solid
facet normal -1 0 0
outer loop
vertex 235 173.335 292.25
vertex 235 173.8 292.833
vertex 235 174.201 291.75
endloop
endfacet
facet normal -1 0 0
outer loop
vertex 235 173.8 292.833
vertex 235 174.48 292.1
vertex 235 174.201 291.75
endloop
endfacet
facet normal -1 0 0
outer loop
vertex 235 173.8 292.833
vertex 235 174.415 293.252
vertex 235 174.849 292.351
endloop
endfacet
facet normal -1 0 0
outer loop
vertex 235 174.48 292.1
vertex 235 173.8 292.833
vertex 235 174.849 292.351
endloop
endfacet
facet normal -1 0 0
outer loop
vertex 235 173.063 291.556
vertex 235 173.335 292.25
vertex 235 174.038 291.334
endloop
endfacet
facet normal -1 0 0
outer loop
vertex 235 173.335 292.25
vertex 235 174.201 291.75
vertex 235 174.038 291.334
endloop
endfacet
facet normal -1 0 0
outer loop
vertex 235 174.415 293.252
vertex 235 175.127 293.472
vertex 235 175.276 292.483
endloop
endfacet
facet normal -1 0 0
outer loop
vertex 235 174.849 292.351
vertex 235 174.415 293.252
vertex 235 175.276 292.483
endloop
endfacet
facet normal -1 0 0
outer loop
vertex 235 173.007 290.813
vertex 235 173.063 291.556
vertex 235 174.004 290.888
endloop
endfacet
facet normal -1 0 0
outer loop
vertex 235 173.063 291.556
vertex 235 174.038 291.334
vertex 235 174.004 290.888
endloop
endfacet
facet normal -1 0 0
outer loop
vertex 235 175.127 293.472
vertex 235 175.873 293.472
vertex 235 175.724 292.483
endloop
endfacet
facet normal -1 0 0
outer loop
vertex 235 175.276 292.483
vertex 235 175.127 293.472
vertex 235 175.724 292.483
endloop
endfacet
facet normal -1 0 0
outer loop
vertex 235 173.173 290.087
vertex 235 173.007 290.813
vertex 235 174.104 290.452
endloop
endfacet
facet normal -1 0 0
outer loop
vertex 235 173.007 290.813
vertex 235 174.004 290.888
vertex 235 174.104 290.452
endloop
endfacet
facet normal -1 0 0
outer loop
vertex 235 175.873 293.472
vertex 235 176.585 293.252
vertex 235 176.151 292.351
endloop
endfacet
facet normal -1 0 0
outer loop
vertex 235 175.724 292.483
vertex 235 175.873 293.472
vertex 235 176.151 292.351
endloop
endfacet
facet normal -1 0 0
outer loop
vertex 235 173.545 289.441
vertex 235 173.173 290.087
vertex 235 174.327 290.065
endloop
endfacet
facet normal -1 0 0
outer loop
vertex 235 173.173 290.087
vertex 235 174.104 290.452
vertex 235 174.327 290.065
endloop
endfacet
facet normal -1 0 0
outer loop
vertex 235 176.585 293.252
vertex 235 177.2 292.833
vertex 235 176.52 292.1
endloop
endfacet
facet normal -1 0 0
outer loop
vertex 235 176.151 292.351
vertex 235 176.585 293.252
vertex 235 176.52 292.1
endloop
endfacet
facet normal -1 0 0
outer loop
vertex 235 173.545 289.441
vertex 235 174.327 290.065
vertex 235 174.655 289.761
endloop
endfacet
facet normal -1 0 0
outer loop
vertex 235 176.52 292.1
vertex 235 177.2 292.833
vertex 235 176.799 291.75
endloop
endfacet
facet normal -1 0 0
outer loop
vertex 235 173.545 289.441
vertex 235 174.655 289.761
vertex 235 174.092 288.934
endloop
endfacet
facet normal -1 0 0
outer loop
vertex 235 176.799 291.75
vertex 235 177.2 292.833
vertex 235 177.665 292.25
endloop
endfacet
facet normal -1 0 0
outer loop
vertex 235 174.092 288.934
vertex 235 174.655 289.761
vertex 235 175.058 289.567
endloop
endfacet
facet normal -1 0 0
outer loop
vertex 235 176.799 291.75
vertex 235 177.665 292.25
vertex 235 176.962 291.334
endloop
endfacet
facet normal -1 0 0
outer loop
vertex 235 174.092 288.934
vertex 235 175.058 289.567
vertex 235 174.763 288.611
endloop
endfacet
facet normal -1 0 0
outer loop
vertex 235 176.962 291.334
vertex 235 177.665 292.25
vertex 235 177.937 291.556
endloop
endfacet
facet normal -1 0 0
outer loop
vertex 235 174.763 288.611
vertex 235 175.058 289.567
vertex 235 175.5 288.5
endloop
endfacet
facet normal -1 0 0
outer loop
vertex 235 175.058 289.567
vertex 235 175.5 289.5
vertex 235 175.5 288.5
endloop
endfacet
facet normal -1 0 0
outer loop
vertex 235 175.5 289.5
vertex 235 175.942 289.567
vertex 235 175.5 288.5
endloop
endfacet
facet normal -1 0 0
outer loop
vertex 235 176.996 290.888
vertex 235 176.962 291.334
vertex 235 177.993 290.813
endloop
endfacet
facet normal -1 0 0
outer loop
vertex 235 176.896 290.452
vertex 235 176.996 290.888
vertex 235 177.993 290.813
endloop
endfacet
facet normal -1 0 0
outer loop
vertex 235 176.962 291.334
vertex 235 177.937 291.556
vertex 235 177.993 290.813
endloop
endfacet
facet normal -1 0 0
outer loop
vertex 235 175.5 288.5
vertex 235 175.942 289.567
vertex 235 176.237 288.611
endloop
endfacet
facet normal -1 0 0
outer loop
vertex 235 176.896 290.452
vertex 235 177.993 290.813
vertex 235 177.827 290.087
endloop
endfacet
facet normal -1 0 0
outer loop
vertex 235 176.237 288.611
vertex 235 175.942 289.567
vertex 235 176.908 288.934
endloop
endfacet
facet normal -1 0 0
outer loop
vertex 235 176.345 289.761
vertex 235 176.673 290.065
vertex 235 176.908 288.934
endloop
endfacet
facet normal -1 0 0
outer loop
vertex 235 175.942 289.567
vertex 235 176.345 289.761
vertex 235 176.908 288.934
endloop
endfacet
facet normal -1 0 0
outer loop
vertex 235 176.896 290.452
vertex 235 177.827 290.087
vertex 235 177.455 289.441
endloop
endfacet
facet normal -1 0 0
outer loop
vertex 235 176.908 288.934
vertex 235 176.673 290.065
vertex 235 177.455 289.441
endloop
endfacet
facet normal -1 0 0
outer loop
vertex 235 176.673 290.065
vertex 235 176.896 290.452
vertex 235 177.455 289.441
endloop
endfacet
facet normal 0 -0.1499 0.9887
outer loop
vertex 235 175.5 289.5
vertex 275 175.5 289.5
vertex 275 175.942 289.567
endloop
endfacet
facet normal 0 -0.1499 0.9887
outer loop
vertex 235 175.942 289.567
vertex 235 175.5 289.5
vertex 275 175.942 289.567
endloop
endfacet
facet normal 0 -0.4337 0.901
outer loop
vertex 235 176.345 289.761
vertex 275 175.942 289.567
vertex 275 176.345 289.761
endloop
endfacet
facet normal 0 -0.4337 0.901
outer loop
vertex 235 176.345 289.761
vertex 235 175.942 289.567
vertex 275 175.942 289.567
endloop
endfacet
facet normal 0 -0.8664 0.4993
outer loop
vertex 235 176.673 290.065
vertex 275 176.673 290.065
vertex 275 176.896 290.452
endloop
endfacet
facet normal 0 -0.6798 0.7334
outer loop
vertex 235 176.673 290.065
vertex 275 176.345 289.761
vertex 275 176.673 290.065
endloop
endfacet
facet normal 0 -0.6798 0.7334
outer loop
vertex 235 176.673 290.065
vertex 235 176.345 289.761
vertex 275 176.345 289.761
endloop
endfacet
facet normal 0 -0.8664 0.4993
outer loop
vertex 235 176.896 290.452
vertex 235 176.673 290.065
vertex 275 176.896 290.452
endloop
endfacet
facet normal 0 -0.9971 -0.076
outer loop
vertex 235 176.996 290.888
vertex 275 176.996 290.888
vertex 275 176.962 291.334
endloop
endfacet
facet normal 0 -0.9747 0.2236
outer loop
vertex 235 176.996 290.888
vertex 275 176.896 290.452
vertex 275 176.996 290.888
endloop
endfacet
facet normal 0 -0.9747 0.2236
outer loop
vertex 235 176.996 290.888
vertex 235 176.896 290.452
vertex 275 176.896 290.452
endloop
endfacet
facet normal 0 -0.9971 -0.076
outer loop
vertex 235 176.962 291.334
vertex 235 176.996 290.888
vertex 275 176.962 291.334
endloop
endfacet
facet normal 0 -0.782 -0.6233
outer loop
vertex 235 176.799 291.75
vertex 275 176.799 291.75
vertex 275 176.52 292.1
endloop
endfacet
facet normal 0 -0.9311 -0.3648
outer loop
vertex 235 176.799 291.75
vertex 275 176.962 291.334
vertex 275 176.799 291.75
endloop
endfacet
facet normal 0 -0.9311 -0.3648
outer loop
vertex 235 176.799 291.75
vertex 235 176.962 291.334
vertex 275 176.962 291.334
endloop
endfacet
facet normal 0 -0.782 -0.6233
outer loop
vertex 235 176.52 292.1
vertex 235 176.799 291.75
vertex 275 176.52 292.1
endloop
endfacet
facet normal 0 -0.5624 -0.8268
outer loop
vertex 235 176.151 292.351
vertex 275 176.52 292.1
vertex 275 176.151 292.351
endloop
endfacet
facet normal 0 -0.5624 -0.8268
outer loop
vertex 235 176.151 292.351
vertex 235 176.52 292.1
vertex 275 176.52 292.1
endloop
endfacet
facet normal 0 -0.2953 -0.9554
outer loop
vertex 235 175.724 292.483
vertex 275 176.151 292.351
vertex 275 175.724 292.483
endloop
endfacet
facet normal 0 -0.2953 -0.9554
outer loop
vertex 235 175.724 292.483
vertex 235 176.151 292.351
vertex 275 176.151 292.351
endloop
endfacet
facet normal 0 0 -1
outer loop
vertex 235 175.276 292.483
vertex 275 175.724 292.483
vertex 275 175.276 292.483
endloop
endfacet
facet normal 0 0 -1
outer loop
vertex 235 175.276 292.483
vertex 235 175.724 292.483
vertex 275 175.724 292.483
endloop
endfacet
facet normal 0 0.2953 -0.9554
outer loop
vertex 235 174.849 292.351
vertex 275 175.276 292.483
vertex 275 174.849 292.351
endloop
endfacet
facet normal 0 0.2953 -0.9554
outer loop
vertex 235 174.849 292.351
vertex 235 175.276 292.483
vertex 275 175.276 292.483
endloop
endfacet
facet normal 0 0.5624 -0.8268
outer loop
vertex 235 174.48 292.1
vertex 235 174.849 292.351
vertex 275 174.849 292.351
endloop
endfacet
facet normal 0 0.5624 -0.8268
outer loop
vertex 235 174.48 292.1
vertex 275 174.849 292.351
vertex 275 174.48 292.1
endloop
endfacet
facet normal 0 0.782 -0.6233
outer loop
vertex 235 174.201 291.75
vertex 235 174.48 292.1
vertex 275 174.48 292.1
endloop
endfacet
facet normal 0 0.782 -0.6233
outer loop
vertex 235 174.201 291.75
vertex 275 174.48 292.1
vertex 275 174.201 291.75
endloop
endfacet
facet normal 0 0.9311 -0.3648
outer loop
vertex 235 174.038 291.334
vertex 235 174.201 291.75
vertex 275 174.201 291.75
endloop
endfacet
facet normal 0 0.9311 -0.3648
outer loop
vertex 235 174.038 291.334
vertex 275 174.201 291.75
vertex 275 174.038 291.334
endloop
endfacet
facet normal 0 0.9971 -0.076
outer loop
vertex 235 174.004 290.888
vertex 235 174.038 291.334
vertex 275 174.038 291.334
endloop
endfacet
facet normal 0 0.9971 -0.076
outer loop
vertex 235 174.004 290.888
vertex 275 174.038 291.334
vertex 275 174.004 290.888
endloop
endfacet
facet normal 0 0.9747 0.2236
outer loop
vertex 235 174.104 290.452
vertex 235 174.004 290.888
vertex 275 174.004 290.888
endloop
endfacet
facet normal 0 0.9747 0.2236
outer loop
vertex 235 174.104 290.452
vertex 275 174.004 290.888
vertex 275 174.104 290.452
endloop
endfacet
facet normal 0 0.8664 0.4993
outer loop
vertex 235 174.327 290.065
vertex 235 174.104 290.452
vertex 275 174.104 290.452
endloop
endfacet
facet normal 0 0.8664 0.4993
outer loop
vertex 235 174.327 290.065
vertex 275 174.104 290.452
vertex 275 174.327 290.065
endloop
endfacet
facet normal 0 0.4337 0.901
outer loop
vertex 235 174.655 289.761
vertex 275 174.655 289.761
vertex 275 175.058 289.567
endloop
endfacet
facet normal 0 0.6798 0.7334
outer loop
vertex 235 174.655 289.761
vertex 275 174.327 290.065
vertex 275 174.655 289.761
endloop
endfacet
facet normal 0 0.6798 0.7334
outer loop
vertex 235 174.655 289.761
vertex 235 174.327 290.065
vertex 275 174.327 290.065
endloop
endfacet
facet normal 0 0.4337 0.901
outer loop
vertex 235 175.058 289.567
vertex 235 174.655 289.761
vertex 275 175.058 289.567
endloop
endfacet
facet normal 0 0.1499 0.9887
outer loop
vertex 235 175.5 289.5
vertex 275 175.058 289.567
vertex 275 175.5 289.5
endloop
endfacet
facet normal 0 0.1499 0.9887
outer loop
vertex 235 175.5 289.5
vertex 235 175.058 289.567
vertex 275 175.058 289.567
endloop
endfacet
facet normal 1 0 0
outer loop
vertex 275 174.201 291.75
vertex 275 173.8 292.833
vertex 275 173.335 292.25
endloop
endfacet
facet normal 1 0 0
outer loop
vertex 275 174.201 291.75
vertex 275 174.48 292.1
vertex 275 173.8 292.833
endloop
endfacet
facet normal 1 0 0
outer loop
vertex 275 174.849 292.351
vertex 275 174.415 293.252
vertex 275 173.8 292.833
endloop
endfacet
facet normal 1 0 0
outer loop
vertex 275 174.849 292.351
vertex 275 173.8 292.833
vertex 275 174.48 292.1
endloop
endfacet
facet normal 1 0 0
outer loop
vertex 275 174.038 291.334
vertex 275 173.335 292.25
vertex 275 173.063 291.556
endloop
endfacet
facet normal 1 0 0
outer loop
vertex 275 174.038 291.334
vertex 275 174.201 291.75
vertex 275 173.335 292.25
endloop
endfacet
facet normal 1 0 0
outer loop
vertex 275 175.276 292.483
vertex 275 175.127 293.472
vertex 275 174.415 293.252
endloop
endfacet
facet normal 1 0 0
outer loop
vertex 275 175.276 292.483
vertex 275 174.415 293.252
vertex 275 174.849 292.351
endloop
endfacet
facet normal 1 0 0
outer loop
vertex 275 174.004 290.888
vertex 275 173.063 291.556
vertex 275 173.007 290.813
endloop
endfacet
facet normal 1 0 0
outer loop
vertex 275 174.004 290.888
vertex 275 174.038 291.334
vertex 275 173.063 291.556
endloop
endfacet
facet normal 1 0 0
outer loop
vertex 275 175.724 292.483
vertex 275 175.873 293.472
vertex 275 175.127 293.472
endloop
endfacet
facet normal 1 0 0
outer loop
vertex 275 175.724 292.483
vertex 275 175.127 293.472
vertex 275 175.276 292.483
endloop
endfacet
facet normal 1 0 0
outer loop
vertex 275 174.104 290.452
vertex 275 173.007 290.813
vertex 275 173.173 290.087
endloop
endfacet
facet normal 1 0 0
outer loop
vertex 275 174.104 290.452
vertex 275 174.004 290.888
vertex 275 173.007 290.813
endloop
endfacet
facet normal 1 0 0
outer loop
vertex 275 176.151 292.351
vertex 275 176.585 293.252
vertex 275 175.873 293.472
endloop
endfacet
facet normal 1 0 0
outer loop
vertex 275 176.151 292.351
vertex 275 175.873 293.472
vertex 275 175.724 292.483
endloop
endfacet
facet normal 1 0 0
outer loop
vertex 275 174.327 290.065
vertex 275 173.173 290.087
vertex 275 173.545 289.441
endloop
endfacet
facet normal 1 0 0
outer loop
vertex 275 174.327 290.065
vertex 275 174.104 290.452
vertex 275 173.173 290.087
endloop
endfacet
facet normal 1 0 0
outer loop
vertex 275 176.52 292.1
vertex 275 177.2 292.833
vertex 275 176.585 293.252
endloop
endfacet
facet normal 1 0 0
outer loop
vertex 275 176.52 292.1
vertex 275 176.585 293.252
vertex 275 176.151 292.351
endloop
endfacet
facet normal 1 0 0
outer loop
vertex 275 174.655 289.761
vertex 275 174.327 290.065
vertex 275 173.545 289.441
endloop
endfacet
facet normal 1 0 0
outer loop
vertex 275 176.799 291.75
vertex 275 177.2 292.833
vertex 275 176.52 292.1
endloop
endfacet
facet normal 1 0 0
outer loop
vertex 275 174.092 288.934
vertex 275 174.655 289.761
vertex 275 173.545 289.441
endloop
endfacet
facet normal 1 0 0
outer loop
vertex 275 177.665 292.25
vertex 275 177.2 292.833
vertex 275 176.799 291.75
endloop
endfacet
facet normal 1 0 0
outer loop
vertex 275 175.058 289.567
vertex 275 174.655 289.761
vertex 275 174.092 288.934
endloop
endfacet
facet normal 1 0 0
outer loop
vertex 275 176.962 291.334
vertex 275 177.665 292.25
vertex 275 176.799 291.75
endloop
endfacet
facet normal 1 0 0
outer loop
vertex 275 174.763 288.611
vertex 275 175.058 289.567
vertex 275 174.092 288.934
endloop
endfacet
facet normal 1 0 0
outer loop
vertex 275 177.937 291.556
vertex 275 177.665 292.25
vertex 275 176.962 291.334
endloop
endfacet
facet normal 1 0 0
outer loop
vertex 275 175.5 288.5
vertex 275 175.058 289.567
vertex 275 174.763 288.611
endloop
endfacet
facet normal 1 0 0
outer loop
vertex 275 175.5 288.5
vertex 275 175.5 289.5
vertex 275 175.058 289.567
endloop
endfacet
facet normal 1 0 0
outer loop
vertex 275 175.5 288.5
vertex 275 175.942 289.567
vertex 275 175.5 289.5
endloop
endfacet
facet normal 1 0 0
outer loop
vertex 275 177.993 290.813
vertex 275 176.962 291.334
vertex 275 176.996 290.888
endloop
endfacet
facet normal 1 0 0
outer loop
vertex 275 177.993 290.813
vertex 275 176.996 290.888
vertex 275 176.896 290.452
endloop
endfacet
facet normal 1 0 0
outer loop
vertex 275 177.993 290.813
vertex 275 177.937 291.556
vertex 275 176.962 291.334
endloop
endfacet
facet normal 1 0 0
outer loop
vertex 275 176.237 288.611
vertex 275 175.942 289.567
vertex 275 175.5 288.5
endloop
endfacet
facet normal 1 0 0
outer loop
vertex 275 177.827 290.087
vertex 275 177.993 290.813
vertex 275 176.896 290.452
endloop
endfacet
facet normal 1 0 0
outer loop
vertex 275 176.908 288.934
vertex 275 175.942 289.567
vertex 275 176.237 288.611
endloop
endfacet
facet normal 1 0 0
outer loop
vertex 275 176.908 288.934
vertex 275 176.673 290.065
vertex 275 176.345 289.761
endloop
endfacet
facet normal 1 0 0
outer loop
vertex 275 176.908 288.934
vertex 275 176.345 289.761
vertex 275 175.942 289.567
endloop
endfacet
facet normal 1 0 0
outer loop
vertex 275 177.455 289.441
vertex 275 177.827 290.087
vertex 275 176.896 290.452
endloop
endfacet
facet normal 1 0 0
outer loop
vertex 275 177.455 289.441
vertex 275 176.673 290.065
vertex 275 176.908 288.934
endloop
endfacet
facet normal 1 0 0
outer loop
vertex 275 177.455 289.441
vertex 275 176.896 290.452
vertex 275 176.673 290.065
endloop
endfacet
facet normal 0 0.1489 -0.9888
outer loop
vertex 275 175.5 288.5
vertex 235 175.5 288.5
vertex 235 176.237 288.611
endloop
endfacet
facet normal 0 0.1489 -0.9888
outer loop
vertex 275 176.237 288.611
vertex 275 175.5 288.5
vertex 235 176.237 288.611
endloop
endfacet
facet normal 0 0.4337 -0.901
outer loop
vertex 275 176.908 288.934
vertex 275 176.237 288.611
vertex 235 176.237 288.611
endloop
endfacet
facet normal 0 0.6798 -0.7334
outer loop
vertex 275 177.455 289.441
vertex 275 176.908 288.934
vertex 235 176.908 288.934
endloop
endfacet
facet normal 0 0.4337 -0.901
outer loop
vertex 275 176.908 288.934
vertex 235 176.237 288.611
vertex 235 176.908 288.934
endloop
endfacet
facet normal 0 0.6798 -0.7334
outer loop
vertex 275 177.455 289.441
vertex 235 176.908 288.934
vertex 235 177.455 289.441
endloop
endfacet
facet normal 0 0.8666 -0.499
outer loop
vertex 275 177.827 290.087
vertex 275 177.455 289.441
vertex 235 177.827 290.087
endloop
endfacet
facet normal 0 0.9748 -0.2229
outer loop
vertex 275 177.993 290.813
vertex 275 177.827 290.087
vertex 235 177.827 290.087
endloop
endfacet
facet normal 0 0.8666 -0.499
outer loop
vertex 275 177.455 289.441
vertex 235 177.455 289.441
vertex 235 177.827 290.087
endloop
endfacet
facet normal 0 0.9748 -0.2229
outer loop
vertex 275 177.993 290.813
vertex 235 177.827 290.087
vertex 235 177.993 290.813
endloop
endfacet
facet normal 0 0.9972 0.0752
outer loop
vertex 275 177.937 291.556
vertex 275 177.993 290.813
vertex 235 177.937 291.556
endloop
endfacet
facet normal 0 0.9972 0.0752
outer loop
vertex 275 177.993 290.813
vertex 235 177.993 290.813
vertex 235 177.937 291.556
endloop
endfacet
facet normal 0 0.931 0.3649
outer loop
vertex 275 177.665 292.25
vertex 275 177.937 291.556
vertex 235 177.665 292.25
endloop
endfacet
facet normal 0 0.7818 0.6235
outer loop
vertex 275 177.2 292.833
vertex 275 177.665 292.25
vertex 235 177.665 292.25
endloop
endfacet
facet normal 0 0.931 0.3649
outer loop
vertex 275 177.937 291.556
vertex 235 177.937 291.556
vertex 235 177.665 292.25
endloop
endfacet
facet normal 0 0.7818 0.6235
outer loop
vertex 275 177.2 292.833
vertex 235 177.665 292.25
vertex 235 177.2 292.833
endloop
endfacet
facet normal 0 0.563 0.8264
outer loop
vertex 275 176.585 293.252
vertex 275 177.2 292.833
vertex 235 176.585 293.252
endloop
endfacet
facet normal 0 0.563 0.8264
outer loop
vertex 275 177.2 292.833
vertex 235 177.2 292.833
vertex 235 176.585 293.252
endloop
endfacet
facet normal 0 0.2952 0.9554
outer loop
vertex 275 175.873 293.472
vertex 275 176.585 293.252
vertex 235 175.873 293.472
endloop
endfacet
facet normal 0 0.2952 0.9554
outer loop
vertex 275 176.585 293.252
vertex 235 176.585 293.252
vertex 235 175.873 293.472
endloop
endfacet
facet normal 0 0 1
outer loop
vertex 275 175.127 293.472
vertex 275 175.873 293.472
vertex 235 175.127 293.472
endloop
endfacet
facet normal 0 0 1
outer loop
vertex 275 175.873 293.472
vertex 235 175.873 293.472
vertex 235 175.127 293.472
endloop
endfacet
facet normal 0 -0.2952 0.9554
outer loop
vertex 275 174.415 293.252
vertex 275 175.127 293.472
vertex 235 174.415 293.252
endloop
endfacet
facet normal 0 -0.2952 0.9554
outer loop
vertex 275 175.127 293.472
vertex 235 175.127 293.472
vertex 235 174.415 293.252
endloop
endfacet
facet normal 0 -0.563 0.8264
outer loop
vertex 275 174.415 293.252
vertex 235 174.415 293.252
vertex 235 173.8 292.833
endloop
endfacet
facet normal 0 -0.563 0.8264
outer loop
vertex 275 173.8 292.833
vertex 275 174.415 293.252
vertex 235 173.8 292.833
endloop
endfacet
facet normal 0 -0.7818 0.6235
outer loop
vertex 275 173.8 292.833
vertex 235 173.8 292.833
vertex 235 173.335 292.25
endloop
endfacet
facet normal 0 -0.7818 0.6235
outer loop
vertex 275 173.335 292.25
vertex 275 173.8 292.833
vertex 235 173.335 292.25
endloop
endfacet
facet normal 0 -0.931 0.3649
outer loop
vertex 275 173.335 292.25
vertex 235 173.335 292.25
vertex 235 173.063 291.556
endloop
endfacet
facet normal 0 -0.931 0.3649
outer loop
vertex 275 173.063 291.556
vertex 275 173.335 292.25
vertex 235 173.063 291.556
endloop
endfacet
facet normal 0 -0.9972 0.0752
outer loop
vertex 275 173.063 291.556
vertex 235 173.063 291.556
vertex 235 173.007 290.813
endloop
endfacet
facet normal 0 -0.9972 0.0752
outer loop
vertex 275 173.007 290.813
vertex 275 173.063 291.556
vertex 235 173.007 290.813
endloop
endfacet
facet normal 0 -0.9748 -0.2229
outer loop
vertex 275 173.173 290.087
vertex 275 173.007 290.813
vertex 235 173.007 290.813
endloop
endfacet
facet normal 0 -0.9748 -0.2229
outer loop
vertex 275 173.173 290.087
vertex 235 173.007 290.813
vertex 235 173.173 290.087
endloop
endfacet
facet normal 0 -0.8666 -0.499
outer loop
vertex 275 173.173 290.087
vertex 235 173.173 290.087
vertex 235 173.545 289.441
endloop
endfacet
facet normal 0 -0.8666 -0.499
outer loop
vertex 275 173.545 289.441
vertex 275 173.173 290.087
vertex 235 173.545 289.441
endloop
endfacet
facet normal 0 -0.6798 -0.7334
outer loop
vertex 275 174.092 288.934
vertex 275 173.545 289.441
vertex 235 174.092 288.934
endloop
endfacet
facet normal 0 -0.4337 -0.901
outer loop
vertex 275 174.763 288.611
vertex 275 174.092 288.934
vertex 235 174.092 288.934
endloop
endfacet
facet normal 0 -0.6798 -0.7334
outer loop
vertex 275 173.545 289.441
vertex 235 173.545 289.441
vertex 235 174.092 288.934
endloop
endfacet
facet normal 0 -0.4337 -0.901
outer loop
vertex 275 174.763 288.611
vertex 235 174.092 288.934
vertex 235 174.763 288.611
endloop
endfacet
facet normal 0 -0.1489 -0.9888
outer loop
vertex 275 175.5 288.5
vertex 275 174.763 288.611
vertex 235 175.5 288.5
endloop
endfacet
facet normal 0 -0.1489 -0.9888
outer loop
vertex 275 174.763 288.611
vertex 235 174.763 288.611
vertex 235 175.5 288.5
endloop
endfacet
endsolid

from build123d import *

# Parameters (mm, degrees)
CYLINDER001_R           = 1.5
CYLINDER001_DEPTH       = 44
CYLINDER001_PITCH_ANGLE = 90
CYLINDER_R              = 2.5
CYLINDER_DEPTH          = 40
CYLINDER_PITCH_ANGLE    = 90


with BuildPart() as cilindro001:
    # Cylinder001 → Cylinder001 (new body)
    with BuildSketch(Plane.XY):
        Circle(CYLINDER001_R)
    extrude(amount=CYLINDER001_DEPTH)


with BuildPart() as cilindro001_1:
    # Cylinder001 pitch: moved
    add(cilindro001.part.rotate(Axis((0, 0, 0), (0, 1, 0)), CYLINDER001_PITCH_ANGLE))


with BuildPart() as cilindro001_2:
    # Cylinder001 placement: moved
    add(cilindro001_1.part.moved(Location((-2, 0, 0))))


with BuildPart() as soporte1:
    # Cylinder → Cylinder (new body)
    with BuildSketch(Plane.XY):
        Circle(CYLINDER_R)
    extrude(amount=CYLINDER_DEPTH)


with BuildPart() as soporte1_1:
    # Cylinder pitch: moved
    add(soporte1.part.rotate(Axis((0, 0, 0), (0, 1, 0)), CYLINDER_PITCH_ANGLE))


with BuildPart() as soporte1_2:
    # Cylinder placement: moved
    add(soporte1_1.part)

    # Cut: cut Cilindro001
    add(cilindro001_2.part, mode=Mode.SUBTRACT)


with BuildPart() as soporte1_3:
    # Cut placement: moved
    add(soporte1_2.part.moved(Location((235, 175.5, 291))))


solid = soporte1_3.part
